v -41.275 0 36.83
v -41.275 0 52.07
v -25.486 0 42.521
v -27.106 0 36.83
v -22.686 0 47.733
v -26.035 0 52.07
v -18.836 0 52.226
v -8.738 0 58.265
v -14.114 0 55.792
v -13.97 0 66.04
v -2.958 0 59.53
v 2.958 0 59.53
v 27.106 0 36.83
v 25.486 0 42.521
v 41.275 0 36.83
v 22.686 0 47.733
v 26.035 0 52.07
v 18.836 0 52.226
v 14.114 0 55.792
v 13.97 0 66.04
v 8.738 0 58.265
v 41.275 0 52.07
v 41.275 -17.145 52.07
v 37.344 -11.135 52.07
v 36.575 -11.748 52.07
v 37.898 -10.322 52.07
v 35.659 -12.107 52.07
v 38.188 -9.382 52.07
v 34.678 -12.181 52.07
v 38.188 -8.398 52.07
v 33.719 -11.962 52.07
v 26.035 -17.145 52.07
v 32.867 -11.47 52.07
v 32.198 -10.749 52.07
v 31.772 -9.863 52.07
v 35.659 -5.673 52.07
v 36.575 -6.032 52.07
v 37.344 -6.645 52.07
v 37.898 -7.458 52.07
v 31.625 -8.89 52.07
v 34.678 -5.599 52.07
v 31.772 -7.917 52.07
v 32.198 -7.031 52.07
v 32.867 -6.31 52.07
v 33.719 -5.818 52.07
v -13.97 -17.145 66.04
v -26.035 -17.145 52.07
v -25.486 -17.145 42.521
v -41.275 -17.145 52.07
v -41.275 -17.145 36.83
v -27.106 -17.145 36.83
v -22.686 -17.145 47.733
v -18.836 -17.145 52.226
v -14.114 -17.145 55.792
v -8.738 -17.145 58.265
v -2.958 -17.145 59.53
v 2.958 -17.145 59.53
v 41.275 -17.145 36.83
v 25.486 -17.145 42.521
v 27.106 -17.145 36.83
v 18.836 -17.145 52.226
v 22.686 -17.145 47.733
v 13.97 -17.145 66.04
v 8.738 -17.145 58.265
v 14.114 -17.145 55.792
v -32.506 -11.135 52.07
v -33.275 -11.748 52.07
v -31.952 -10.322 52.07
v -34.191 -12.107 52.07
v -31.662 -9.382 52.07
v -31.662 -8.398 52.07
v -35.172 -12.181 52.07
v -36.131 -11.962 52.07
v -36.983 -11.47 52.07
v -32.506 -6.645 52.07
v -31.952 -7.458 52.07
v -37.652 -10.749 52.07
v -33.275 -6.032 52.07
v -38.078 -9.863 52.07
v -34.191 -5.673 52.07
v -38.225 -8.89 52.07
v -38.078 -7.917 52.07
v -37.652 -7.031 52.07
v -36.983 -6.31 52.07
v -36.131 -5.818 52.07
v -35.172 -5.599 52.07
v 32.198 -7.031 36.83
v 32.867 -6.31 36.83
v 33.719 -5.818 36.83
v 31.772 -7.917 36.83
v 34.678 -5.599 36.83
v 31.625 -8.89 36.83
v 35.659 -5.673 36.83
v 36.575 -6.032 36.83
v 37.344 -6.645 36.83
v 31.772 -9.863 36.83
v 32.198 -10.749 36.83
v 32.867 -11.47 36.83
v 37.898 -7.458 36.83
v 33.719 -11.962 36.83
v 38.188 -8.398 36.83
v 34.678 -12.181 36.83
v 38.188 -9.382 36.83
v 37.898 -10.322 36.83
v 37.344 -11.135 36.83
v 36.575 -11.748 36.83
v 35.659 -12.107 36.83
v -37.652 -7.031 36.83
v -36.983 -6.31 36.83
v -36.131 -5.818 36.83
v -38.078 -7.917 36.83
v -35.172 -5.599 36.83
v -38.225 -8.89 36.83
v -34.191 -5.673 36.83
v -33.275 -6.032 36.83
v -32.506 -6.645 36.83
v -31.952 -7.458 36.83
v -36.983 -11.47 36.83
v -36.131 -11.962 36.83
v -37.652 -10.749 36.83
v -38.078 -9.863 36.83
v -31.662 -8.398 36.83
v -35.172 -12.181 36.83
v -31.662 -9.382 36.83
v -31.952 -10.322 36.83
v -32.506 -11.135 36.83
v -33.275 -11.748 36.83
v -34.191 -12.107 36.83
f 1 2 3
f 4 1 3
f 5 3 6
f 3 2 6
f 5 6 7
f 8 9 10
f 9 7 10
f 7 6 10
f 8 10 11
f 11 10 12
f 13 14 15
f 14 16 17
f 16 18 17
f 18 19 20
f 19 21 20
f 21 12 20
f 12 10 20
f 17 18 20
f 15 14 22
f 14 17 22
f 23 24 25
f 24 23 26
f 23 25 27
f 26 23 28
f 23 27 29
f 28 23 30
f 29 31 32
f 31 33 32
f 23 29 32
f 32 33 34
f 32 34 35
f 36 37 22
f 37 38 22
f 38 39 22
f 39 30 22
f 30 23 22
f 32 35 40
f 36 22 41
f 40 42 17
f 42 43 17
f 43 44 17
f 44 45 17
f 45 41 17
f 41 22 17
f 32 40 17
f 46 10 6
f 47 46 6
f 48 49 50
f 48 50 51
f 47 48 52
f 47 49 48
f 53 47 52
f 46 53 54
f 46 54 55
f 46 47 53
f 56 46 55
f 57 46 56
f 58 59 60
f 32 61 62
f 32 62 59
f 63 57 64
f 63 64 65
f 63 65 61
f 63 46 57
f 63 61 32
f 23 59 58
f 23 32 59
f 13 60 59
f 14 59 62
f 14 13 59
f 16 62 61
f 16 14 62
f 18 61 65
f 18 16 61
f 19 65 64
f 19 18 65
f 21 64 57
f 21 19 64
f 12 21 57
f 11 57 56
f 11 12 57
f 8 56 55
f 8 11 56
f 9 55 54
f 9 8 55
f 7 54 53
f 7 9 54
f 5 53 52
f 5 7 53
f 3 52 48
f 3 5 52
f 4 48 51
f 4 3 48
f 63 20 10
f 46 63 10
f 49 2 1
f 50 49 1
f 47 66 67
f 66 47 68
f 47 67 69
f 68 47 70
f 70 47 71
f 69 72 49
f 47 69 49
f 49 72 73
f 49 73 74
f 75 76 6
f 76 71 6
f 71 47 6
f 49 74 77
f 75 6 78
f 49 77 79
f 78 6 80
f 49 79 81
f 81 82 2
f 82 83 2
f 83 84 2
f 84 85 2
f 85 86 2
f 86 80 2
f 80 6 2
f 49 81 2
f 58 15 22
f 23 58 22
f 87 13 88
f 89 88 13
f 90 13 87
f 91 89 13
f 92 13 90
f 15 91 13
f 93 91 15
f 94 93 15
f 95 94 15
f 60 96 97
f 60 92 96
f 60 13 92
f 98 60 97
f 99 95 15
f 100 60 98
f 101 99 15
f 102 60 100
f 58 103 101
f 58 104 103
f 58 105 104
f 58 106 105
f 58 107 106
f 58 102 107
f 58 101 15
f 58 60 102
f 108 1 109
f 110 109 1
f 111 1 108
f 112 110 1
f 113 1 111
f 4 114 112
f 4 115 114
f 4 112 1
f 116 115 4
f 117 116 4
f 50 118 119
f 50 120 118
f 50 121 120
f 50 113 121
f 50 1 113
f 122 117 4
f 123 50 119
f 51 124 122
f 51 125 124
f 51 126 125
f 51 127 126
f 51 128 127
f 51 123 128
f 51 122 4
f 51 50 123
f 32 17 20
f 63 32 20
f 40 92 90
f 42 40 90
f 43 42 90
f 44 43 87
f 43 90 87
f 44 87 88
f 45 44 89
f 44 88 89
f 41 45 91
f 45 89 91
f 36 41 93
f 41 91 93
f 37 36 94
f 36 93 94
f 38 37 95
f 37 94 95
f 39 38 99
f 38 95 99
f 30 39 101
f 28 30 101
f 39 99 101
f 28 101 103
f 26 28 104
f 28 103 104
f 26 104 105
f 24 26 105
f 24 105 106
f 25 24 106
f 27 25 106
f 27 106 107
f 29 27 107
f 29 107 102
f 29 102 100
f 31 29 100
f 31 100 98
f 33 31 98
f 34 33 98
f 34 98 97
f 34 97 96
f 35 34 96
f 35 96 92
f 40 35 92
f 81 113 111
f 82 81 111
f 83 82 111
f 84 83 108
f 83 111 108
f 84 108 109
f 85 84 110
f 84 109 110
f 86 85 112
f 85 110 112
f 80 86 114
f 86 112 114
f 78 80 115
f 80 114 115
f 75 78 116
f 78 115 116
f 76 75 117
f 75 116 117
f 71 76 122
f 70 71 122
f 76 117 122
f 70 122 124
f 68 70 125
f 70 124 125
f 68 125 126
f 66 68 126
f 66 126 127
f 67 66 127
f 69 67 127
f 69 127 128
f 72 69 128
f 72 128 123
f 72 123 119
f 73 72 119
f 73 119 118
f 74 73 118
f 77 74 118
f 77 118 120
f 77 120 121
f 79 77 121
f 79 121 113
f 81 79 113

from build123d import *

# Parameters (mm, degrees)
F0_R     = 27.5
F1_DEPTH = 38.1
F2_W     = 19.05
F2_H     = 5.08
F3_DEPTH = 38.1
F5_D     = 6.6
F6_W     = 88.9
F6_H     = 38.1
F7_DEPTH = 36.83
F8_W     = 82.55
F8_H     = 29.21
F9_DEPTH = 20.955


with BuildPart() as f1:
    # F0 (on Front) → F1 (new body)
    with BuildSketch(Plane.XZ):
        Polygon((-44.45, 0), (0, 0), (44.45, 0), (44.45, 17.78), (41.275, 19.05), (41.275, 52.07), (26.035, 52.07), (13.97, 66.04), (0, 66.04), (-13.97, 66.04), (-26.035, 52.07), (-41.275, 52.07), (-41.275, 19.05), (-44.45, 17.78), align=None)
        with Locations((0, 32.19)):
            Circle(F0_R, mode=Mode.SUBTRACT)
    extrude(amount=F1_DEPTH)

    # F2 (on face) → F3 (cut, through all)
    with BuildSketch(Plane.XZ.offset(38.1)):
        with Locations((-31.75, 34.29)):
            Rectangle(F2_W, F2_H)
    extrude(amount=-F3_DEPTH, mode=Mode.SUBTRACT)

    # F5 (through all)
    with Locations(Plane.XY.offset(52.07)):
        with Locations((-34.925, -8.89), (-34.925, -29.21), (34.925, -8.89), (34.925, -29.21)):
            Hole(F5_D / 2)

    # F6 (on face) → F7 (cut, through all)
    with BuildSketch(Plane(origin=(0, 0, 0), x_dir=(1, 0, 0), z_dir=(0, 0, -1))):
        with Locations((0, 19.05)):
            Rectangle(F6_W, F6_H)
    extrude(amount=-F7_DEPTH, mode=Mode.SUBTRACT)

    # F8 (on face) → F9 (cut)
    with BuildSketch(Plane.XZ.offset(38.1)):
        with Locations((0, 51.435)):
            Rectangle(F8_W, F8_H)
    extrude(amount=-F9_DEPTH, mode=Mode.SUBTRACT)


solid = f1.part
